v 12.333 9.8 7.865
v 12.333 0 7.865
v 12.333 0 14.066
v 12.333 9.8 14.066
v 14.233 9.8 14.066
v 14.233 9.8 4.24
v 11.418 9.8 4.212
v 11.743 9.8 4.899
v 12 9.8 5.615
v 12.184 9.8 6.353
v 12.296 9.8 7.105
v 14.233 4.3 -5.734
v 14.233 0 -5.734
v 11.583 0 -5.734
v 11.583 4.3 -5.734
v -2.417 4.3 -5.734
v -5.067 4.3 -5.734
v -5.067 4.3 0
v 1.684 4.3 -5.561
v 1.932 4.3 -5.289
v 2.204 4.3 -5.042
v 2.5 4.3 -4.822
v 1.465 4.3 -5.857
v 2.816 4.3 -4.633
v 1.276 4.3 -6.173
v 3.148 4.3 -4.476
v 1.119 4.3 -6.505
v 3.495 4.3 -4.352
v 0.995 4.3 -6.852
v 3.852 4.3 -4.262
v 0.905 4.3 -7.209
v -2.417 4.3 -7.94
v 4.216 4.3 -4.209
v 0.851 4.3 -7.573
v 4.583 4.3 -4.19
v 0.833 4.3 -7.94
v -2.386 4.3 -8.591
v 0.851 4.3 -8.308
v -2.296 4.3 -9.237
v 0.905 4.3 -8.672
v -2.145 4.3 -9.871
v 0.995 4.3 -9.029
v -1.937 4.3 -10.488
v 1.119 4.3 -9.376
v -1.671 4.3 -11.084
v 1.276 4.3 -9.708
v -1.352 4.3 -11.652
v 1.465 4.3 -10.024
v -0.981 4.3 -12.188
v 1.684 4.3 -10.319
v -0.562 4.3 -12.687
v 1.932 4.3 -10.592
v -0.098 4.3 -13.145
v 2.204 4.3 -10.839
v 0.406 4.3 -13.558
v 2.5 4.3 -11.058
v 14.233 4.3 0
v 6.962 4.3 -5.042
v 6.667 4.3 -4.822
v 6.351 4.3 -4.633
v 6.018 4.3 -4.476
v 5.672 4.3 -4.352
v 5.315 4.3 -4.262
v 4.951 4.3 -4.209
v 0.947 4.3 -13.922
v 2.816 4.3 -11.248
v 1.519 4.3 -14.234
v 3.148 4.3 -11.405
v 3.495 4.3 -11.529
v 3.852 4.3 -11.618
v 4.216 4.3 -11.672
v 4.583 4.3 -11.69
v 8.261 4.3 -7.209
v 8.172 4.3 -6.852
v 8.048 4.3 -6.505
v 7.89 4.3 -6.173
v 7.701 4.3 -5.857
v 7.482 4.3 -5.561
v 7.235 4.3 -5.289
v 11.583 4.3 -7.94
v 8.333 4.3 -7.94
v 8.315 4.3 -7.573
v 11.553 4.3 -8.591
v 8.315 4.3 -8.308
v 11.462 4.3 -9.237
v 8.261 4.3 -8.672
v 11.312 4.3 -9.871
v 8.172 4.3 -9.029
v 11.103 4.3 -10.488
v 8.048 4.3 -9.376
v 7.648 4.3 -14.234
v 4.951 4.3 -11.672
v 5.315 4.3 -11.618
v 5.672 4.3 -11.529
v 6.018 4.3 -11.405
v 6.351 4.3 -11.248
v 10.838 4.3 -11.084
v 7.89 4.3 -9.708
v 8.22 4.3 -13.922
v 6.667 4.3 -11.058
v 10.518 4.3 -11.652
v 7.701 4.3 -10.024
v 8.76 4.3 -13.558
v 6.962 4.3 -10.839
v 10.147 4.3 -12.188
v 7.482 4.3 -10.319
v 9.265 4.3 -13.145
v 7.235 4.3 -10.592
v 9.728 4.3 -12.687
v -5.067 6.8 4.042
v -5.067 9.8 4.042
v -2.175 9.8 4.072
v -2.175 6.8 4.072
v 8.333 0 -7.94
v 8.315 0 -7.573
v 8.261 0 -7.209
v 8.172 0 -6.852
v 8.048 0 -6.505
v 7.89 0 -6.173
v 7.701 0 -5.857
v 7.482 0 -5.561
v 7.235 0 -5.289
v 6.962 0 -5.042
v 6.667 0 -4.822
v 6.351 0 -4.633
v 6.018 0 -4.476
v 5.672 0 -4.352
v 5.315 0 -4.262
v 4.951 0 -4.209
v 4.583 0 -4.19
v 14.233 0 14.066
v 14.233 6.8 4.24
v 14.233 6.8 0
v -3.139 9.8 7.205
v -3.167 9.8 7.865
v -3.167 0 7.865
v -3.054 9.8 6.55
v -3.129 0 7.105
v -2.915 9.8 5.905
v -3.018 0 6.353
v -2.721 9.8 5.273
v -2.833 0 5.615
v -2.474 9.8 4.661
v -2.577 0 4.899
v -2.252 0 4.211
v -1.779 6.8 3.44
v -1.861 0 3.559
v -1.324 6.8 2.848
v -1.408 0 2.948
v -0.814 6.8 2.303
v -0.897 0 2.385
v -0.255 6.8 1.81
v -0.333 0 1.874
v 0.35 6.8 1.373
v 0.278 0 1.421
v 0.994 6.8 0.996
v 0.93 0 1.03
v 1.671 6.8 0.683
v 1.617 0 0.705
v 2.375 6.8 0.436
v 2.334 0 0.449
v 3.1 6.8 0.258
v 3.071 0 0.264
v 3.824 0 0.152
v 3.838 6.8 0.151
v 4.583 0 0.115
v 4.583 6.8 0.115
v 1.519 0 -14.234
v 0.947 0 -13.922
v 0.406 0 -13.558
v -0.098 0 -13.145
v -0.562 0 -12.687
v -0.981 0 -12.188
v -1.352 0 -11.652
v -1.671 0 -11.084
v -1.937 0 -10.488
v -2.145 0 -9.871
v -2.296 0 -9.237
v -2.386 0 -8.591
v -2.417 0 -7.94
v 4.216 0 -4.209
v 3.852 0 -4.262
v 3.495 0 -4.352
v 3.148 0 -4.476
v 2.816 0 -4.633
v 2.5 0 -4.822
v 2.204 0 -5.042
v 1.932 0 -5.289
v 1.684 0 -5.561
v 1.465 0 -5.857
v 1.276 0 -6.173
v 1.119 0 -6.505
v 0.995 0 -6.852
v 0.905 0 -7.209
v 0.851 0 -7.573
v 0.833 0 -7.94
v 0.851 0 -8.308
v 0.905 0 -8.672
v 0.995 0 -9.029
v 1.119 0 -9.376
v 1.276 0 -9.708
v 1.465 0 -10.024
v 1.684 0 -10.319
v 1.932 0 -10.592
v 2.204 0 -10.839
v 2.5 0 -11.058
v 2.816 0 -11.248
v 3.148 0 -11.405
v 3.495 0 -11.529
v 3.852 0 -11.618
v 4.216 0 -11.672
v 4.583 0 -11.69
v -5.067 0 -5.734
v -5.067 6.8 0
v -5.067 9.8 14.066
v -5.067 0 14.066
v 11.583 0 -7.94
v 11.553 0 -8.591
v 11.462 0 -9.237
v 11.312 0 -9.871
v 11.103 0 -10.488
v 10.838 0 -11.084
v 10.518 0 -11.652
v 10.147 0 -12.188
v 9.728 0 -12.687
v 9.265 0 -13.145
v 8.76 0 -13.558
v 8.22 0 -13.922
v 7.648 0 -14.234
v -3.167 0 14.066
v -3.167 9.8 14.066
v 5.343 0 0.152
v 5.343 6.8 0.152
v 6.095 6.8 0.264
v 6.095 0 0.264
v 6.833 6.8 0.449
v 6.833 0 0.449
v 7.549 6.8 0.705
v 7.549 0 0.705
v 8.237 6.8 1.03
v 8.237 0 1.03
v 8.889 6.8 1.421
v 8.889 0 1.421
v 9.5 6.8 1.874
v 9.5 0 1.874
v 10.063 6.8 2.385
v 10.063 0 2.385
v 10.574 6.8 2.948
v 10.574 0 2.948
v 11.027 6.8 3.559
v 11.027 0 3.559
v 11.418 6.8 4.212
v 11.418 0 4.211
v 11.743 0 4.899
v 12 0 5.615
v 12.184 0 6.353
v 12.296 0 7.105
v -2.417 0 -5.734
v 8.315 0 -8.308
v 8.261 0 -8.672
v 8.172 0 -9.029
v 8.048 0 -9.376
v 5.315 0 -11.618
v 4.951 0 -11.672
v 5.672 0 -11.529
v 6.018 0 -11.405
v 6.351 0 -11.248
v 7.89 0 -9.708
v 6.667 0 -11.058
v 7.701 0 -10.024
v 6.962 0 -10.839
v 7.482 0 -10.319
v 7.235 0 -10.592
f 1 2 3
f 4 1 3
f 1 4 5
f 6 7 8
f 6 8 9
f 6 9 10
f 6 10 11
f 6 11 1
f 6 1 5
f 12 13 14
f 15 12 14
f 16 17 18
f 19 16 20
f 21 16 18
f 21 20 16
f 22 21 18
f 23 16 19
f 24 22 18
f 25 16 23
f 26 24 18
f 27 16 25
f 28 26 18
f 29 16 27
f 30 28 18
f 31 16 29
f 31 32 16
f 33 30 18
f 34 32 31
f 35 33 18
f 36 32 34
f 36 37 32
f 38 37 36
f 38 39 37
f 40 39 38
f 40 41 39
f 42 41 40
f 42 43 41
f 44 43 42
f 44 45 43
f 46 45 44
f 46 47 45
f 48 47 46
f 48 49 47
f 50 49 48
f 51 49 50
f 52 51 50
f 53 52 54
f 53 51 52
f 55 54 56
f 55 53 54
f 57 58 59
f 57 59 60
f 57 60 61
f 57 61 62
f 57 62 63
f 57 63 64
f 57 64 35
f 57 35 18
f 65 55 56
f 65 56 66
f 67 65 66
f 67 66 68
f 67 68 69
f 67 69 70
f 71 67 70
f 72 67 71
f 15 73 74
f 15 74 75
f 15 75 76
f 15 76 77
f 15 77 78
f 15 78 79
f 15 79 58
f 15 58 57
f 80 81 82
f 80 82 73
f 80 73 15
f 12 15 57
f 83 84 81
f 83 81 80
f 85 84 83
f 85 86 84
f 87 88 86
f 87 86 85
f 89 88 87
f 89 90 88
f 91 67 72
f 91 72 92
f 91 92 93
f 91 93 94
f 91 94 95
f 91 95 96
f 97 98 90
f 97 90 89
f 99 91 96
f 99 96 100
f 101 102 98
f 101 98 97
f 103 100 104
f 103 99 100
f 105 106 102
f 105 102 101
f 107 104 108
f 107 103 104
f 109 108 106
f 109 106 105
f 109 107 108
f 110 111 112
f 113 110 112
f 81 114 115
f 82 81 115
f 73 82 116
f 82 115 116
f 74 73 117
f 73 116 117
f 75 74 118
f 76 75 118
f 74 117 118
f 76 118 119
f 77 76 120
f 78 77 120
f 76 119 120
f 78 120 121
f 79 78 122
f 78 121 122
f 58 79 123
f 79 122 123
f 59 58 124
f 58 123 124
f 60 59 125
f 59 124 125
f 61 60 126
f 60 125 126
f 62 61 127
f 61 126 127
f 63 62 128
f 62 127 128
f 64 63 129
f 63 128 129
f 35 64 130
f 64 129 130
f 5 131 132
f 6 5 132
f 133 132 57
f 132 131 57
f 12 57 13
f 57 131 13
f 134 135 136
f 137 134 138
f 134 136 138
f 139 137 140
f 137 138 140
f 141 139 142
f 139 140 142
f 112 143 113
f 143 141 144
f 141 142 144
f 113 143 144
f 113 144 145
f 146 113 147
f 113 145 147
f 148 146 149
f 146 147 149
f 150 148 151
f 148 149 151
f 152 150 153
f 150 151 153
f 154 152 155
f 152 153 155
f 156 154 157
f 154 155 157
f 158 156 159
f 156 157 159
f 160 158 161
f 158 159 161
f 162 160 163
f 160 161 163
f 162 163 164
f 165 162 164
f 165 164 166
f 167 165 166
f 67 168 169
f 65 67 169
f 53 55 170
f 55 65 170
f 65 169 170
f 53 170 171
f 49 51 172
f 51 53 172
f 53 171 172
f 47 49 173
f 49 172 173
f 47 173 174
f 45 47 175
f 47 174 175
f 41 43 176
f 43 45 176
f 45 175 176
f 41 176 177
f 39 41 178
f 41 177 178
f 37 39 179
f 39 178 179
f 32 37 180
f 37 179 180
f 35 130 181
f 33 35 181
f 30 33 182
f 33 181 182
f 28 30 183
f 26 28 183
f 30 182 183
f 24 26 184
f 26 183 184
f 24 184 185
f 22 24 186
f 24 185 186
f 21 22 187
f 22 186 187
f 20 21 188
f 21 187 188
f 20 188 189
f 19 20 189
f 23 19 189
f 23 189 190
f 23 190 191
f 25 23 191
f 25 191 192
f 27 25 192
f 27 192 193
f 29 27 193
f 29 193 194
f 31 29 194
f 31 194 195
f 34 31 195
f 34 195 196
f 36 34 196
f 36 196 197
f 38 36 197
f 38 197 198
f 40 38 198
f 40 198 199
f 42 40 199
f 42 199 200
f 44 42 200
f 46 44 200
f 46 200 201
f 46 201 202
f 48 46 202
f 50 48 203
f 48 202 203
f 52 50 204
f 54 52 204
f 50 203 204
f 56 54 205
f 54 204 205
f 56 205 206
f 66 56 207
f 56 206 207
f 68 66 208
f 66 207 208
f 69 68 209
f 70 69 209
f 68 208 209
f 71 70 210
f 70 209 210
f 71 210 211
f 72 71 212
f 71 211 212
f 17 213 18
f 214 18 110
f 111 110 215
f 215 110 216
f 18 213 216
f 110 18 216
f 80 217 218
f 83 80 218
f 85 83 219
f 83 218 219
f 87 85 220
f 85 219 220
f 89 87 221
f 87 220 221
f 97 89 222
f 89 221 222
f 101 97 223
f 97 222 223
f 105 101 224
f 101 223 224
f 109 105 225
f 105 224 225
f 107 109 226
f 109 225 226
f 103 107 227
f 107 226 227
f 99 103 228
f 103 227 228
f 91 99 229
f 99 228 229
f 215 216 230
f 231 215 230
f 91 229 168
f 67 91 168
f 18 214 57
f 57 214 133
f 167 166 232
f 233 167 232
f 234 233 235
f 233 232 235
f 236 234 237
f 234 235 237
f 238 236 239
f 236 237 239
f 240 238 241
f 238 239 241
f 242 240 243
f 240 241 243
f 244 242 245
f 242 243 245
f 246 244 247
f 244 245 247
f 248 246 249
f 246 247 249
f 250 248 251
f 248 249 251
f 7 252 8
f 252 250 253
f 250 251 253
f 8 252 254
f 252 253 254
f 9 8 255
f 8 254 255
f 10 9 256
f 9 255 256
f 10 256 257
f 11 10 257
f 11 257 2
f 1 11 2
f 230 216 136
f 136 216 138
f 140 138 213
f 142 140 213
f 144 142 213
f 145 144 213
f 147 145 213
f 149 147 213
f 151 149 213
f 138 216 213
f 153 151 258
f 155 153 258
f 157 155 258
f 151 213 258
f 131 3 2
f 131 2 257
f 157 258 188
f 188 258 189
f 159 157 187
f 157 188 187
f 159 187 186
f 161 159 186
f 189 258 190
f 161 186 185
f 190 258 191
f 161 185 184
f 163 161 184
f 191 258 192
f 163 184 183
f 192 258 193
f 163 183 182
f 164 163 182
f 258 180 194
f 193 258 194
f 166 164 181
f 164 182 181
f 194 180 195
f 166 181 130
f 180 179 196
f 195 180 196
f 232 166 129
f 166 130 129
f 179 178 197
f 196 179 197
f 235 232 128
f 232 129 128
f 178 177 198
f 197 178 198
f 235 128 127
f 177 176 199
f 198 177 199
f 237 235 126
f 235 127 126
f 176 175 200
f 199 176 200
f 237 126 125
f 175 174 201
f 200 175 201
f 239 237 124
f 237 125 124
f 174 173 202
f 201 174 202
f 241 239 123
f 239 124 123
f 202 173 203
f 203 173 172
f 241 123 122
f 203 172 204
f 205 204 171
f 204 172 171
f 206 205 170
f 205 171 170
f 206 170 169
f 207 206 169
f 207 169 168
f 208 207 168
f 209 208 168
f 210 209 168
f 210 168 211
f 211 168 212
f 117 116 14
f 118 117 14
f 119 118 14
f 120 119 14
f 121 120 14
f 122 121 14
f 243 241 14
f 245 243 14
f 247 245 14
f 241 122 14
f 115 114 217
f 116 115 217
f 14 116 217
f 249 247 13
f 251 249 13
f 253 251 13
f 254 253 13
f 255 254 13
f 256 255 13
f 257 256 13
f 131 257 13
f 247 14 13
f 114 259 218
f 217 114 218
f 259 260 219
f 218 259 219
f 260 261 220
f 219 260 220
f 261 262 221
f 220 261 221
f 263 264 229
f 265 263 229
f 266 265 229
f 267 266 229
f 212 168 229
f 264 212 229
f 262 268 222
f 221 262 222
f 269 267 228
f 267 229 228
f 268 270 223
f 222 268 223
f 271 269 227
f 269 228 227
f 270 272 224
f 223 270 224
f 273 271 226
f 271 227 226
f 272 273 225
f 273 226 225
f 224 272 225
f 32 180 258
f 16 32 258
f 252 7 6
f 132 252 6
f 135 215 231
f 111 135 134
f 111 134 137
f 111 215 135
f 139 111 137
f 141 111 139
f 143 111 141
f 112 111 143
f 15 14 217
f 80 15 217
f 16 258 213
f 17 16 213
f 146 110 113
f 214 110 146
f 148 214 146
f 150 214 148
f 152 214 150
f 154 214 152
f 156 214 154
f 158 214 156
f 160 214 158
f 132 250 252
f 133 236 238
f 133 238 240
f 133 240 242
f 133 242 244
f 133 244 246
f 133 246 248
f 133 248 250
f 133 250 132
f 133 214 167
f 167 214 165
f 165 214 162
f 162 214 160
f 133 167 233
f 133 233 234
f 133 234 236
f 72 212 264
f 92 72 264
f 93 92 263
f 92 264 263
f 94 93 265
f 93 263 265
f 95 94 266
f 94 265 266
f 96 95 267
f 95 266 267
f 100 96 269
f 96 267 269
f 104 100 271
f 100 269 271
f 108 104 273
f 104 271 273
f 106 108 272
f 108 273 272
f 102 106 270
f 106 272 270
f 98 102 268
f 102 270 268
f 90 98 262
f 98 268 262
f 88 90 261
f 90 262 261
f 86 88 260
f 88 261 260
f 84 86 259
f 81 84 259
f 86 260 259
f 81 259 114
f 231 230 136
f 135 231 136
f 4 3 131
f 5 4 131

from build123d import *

# Parameters (mm, degrees)
EXTRUDE_2_DEPTH     = 9.8
CUT_EXTRUDE_1_DEPTH = 3
CUT_EXTRUDE_2_DEPTH = 2.5


with BuildPart() as part:
    # 草图1 → 凸台-拉伸2 (new body)
    with BuildSketch(Plane(origin=(0, 0, 0), x_dir=(1, 0, 0), z_dir=(0, 1, 0))):
        with BuildLine():
            Line((4.583240997, 11.690443213), (4.583240997, 14.234072022))
            Line((4.583240997, 14.234072022), (1.518891733, 14.234072022))
            ThreePointArc((1.518891733, 14.234072022), (-1.351843031, 11.65188196), (-2.416759003, 7.940443213))
            Line((-2.416759003, 7.940443213), (-2.416759003, 5.734072022))
            Line((-2.416759003, 5.734072022), (-5.066759003, 5.734072022))
            Line((-5.066759003, 5.734072022), (-5.066759003, -14.065927978))
            Line((-5.066759003, -14.065927978), (-3.166759003, -14.065927978))
            Line((-3.166759003, -14.065927978), (-3.166759003, -7.864819945))
            ThreePointArc((-3.166759003, -7.864819945), (-0.896836557, -2.38474239), (4.583240997, -0.114819945))
            Line((4.583240997, -0.114819945), (4.583240997, 4.190443213))
            ThreePointArc((4.583240997, 4.190443213), (0.833240997, 7.940443213), (4.583240997, 11.690443213))
        make_face()
        with BuildLine():
            ThreePointArc((11.583240997, 7.940443213), (10.518325026, 11.65188196), (7.647590262, 14.234072022))
            Line((7.647590262, 14.234072022), (4.583240997, 14.234072022))
            Line((4.583240997, 14.234072022), (4.583240997, 11.690443213))
            ThreePointArc((4.583240997, 11.690443213), (7.234891427, 10.592093643), (8.333240997, 7.940443213))
            ThreePointArc((8.333240997, 7.940443213), (7.234891427, 5.288792784), (4.583240997, 4.190443213))
            Line((4.583240997, 4.190443213), (4.583240997, -0.114819945))
            ThreePointArc((4.583240997, -0.114819945), (10.063318551, -2.38474239), (12.333240997, -7.864819945))
            Line((12.333240997, -7.864819945), (12.333240997, -14.065927978))
            Line((12.333240997, -14.065927978), (14.233240997, -14.065927978))
            Line((14.233240997, -14.065927978), (14.233240997, 5.734072022))
            Line((14.233240997, 5.734072022), (11.583240997, 5.734072022))
            Line((11.583240997, 5.734072022), (11.583240997, 7.940443213))
        make_face()
    extrude(amount=EXTRUDE_2_DEPTH)

    # 草图2 → 切除-拉伸1 (cut)
    with BuildSketch(Plane(origin=(0, 9.8, 0), x_dir=(1, 0, 0), z_dir=(0, 1, 0))):
        Polygon((-7.578838201, -4.016286107), (16.085093039, -4.259527691), (16.085093039, 14.991306239), (-7.578838201, 14.991306239), align=None)
    extrude(amount=-CUT_EXTRUDE_1_DEPTH, mode=Mode.SUBTRACT)

    # 草图3 → 切除-拉伸2 (cut)
    with BuildSketch(Plane(origin=(0, 6.8, 0), x_dir=(1, 0, 0), z_dir=(0, 1, 0))):
        Polygon((-9.750638057, 0), (19.90166932, 0), (19.90166932, 15.470839647), (-9.750638057, 15.762729548), align=None)
    extrude(amount=-CUT_EXTRUDE_2_DEPTH, mode=Mode.SUBTRACT)


solid = part.part
